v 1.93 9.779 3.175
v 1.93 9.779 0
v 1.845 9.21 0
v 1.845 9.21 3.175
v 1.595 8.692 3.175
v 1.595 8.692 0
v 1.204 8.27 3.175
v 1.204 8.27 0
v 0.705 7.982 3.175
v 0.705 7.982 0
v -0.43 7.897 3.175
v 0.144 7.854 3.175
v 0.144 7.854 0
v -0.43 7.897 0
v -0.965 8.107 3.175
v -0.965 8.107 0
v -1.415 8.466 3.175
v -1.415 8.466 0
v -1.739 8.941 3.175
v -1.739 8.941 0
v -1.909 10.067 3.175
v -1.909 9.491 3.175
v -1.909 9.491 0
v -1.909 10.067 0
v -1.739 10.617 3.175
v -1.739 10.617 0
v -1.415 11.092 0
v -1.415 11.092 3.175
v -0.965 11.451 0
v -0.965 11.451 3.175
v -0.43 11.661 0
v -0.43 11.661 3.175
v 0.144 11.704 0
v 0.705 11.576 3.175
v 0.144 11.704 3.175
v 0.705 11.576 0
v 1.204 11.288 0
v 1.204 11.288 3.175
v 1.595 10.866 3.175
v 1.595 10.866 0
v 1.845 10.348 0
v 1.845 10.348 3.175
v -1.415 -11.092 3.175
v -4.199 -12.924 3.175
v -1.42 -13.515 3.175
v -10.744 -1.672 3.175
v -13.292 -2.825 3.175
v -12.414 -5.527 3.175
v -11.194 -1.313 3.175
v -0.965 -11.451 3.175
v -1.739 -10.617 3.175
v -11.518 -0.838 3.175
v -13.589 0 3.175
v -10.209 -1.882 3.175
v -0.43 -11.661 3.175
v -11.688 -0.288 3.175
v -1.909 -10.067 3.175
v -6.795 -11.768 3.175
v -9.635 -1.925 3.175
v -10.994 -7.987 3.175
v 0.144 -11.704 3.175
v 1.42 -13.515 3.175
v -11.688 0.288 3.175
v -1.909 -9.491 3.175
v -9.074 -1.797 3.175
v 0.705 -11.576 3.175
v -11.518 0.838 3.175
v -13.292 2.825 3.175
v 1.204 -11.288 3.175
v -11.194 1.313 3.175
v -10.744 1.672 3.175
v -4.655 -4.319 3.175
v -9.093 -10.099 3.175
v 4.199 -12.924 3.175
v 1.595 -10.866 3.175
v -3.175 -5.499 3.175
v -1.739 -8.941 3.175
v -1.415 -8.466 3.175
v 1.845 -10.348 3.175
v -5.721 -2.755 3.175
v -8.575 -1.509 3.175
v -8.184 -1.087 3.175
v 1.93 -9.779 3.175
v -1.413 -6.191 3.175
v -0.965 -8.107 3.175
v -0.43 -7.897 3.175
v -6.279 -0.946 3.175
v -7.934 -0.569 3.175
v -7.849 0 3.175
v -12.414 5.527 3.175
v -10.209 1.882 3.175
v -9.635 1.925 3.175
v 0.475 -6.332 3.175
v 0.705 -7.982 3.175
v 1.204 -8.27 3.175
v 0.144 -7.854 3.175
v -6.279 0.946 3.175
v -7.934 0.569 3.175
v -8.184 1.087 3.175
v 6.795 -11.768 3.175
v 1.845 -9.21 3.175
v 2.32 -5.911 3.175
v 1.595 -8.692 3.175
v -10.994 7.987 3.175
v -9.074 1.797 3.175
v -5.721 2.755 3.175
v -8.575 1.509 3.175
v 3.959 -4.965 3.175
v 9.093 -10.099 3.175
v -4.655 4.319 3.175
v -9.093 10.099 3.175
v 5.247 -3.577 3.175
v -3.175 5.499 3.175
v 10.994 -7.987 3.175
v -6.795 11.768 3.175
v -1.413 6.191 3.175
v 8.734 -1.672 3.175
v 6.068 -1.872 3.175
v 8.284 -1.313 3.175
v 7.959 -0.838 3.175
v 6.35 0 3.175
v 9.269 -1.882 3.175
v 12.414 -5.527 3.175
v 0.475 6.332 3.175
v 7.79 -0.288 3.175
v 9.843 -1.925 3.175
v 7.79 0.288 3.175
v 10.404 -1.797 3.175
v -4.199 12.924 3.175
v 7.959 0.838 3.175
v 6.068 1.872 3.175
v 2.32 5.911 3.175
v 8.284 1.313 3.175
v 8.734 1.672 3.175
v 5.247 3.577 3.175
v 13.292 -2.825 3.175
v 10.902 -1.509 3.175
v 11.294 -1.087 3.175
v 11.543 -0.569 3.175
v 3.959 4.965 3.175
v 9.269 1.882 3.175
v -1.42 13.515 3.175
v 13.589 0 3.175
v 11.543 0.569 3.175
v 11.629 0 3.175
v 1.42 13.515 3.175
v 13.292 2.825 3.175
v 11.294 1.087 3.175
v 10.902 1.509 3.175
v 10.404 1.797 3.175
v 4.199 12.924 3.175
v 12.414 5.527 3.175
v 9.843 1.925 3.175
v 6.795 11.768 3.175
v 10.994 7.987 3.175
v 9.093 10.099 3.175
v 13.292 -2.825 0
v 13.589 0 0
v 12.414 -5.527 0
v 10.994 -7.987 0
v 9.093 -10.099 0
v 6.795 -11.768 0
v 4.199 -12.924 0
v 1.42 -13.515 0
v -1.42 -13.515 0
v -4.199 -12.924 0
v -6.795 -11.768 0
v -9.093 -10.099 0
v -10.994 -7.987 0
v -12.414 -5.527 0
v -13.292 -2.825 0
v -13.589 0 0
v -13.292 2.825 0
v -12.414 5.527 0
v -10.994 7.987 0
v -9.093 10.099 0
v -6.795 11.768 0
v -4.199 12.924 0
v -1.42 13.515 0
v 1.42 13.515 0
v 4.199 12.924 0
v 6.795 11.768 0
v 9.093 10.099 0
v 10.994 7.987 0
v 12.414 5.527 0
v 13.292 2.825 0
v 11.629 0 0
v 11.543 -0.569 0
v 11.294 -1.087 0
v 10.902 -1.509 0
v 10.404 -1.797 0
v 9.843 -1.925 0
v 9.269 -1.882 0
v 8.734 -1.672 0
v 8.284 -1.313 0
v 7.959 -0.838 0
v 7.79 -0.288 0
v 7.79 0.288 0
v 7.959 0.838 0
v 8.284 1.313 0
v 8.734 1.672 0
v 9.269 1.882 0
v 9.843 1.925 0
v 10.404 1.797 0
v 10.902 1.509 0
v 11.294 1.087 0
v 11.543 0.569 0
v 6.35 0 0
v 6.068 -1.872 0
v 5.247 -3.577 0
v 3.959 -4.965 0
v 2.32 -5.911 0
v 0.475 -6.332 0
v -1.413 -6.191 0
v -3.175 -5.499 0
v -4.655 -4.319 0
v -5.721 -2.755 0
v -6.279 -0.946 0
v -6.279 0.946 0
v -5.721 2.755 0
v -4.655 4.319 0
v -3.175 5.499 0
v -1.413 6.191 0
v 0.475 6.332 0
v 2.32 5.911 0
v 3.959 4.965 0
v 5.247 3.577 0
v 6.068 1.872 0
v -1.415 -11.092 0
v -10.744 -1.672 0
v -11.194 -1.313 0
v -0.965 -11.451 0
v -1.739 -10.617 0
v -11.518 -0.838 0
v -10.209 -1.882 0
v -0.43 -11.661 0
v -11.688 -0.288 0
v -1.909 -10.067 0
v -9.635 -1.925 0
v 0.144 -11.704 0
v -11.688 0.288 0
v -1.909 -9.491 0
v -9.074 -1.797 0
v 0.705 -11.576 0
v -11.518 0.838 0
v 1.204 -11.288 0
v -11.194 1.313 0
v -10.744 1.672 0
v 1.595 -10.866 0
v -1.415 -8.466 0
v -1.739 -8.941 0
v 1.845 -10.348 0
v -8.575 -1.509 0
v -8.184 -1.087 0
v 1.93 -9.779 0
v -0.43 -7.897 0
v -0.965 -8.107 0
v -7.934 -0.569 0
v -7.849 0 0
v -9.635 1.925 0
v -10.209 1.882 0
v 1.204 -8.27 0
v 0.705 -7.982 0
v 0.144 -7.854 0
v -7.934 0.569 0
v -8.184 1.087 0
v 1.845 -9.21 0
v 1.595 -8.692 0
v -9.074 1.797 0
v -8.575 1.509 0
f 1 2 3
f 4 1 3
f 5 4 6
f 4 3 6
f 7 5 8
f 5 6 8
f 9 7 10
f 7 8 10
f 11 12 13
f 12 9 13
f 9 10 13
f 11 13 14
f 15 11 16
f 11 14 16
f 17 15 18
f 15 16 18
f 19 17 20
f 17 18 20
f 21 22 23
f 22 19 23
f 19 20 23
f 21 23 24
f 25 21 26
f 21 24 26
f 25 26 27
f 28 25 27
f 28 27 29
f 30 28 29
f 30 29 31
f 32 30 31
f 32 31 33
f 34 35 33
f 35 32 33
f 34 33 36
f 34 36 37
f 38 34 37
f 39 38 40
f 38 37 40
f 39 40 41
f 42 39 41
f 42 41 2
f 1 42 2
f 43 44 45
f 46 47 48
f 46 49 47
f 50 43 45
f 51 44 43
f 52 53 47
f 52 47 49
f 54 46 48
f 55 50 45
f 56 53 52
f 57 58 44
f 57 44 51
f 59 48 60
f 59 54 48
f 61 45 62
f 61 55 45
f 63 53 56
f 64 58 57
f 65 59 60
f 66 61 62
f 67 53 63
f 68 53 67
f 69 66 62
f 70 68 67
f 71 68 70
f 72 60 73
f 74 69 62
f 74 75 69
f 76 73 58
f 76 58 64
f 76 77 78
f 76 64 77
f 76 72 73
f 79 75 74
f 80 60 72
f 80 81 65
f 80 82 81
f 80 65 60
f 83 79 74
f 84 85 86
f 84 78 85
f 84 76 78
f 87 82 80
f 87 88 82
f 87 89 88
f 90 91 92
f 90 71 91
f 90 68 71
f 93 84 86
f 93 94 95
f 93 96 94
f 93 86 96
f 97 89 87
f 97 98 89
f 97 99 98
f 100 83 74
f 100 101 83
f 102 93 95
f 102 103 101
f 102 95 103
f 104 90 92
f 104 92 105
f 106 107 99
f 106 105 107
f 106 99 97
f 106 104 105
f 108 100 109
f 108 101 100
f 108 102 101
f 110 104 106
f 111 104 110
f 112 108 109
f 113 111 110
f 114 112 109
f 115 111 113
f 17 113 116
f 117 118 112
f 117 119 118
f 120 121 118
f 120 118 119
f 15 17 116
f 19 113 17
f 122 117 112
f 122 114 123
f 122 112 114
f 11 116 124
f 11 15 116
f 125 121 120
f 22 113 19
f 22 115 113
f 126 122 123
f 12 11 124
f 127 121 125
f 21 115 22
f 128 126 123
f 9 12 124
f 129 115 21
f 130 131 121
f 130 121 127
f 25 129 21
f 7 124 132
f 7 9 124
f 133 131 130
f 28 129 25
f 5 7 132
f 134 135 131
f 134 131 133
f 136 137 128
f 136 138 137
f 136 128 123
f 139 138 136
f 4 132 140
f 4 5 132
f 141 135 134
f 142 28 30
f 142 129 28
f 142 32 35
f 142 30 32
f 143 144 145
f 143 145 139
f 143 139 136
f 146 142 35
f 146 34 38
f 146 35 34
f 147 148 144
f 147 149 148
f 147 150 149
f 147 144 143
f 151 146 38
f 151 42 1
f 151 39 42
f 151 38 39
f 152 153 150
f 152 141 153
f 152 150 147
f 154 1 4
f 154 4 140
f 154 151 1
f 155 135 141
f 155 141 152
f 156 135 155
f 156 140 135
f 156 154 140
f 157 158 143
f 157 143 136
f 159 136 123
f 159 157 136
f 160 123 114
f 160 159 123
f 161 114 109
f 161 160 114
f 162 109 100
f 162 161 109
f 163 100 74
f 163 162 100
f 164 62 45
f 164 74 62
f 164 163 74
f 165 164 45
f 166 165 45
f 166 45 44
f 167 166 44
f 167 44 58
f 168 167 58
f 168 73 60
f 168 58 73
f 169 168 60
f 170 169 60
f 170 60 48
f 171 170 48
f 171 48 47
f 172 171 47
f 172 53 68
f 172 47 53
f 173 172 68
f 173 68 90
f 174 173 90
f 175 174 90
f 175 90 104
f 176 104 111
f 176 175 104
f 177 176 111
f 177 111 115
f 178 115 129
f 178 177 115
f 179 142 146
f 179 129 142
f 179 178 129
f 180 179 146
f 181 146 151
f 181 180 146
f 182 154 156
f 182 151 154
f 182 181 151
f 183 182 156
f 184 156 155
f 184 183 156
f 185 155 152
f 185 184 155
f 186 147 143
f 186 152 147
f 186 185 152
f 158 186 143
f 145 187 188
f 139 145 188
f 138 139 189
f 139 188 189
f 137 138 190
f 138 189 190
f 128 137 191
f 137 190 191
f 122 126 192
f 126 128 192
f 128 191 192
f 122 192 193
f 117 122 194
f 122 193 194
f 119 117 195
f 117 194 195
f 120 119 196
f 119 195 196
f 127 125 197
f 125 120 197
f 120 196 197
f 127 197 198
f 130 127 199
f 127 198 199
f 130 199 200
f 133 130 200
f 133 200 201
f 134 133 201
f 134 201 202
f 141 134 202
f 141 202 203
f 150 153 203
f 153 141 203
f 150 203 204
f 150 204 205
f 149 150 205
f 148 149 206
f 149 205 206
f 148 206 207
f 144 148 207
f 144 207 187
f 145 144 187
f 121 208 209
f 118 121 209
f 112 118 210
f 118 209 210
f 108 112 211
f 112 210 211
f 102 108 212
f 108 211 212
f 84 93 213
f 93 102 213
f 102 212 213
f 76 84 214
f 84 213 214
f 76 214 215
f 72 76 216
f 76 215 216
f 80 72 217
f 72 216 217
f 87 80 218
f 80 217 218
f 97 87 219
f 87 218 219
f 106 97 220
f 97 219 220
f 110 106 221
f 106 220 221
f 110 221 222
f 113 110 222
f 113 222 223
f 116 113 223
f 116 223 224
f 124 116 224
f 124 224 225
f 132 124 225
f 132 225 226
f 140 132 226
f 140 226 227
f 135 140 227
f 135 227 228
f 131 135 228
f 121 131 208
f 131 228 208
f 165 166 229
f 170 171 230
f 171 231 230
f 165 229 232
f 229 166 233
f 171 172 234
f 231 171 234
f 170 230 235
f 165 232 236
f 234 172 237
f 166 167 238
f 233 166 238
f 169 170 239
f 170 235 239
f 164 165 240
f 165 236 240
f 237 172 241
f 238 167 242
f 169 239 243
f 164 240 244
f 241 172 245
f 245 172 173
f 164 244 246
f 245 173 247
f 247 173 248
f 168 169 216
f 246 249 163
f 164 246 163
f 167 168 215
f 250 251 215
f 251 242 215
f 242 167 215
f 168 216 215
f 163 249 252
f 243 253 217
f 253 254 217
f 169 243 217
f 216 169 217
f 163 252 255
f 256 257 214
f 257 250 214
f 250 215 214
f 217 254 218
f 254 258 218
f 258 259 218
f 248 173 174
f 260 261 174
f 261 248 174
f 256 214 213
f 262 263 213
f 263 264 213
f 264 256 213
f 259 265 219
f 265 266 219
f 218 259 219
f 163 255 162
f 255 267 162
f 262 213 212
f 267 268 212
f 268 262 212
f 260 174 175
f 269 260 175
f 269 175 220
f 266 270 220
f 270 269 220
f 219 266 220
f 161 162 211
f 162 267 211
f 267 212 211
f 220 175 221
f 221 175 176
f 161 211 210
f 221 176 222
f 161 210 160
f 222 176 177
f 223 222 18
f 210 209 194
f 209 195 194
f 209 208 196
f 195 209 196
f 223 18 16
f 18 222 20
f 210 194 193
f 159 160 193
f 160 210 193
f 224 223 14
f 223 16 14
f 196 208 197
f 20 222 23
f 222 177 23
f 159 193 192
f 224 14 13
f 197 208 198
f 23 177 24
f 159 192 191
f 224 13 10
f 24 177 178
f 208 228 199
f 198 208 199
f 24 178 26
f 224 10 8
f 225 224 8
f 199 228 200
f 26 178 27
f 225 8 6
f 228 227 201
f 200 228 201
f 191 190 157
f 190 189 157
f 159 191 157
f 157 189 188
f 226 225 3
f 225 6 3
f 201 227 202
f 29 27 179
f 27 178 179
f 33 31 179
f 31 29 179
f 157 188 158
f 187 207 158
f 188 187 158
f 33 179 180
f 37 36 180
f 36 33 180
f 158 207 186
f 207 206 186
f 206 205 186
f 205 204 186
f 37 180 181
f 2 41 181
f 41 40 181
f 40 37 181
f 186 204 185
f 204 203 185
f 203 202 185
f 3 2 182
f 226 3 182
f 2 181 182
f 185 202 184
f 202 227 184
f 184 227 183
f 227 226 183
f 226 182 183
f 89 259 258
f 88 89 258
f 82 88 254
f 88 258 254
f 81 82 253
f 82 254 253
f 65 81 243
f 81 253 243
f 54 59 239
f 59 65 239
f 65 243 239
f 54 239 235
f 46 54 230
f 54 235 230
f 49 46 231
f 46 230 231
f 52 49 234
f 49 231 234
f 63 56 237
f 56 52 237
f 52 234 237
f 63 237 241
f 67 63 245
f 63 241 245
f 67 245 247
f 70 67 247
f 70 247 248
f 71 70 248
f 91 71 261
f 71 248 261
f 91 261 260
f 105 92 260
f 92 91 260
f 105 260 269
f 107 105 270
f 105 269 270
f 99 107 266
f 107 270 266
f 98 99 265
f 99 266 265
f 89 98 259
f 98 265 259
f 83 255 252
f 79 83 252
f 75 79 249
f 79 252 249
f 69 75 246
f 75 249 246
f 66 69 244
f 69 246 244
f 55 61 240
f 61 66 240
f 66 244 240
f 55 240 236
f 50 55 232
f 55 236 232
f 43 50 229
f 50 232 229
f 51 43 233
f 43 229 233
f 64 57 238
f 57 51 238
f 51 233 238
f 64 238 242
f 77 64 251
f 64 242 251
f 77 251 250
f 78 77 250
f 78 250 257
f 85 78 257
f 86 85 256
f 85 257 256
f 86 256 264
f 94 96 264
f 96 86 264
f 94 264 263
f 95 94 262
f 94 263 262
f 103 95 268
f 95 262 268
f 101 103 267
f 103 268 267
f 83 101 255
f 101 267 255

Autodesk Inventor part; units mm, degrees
ref_plane "YZ Plane" through (0, 0, 0) normal (1, 0, 0) x (0, 1, 0)
ref_plane "XZ Plane" through (0, 0, 0) normal (0, 1, 0) x (-1, 0, 0)
ref_plane "XY Plane" through (0, 0, 0) normal (0, 0, 1) x (1, 0, 0)
ref_plane "Work Plane1" through (0, 0, 0) normal (0, 0, 1) x (1, 0, 0)
sketch "Sketch1" plane through (0, 0, 0) normal (0, 0, 1) x (1, 0, 0)
  arc A0 (-12.3389, 9.6089) -> (-9.6089, 12.3389) centre (-10.9739, 10.9739) ccw construction
  circle A1 centre (0, 9.779) radius 1.9304 projected
  circle A2 centre (9.6987, 0) radius 1.9304 projected
  circle A3 centre (0, -9.779) radius 1.9304 projected
  circle A4 centre (-9.779, 0) radius 1.9304 projected
  circle A5 centre (0, 0) radius 6.35 projected
  circle A6 centre (0, 0) radius 13.589
extrude "Extrusion1" add sketch "Sketch1" along normal blind 3.175
properties part number "spool 4in inner plate"
